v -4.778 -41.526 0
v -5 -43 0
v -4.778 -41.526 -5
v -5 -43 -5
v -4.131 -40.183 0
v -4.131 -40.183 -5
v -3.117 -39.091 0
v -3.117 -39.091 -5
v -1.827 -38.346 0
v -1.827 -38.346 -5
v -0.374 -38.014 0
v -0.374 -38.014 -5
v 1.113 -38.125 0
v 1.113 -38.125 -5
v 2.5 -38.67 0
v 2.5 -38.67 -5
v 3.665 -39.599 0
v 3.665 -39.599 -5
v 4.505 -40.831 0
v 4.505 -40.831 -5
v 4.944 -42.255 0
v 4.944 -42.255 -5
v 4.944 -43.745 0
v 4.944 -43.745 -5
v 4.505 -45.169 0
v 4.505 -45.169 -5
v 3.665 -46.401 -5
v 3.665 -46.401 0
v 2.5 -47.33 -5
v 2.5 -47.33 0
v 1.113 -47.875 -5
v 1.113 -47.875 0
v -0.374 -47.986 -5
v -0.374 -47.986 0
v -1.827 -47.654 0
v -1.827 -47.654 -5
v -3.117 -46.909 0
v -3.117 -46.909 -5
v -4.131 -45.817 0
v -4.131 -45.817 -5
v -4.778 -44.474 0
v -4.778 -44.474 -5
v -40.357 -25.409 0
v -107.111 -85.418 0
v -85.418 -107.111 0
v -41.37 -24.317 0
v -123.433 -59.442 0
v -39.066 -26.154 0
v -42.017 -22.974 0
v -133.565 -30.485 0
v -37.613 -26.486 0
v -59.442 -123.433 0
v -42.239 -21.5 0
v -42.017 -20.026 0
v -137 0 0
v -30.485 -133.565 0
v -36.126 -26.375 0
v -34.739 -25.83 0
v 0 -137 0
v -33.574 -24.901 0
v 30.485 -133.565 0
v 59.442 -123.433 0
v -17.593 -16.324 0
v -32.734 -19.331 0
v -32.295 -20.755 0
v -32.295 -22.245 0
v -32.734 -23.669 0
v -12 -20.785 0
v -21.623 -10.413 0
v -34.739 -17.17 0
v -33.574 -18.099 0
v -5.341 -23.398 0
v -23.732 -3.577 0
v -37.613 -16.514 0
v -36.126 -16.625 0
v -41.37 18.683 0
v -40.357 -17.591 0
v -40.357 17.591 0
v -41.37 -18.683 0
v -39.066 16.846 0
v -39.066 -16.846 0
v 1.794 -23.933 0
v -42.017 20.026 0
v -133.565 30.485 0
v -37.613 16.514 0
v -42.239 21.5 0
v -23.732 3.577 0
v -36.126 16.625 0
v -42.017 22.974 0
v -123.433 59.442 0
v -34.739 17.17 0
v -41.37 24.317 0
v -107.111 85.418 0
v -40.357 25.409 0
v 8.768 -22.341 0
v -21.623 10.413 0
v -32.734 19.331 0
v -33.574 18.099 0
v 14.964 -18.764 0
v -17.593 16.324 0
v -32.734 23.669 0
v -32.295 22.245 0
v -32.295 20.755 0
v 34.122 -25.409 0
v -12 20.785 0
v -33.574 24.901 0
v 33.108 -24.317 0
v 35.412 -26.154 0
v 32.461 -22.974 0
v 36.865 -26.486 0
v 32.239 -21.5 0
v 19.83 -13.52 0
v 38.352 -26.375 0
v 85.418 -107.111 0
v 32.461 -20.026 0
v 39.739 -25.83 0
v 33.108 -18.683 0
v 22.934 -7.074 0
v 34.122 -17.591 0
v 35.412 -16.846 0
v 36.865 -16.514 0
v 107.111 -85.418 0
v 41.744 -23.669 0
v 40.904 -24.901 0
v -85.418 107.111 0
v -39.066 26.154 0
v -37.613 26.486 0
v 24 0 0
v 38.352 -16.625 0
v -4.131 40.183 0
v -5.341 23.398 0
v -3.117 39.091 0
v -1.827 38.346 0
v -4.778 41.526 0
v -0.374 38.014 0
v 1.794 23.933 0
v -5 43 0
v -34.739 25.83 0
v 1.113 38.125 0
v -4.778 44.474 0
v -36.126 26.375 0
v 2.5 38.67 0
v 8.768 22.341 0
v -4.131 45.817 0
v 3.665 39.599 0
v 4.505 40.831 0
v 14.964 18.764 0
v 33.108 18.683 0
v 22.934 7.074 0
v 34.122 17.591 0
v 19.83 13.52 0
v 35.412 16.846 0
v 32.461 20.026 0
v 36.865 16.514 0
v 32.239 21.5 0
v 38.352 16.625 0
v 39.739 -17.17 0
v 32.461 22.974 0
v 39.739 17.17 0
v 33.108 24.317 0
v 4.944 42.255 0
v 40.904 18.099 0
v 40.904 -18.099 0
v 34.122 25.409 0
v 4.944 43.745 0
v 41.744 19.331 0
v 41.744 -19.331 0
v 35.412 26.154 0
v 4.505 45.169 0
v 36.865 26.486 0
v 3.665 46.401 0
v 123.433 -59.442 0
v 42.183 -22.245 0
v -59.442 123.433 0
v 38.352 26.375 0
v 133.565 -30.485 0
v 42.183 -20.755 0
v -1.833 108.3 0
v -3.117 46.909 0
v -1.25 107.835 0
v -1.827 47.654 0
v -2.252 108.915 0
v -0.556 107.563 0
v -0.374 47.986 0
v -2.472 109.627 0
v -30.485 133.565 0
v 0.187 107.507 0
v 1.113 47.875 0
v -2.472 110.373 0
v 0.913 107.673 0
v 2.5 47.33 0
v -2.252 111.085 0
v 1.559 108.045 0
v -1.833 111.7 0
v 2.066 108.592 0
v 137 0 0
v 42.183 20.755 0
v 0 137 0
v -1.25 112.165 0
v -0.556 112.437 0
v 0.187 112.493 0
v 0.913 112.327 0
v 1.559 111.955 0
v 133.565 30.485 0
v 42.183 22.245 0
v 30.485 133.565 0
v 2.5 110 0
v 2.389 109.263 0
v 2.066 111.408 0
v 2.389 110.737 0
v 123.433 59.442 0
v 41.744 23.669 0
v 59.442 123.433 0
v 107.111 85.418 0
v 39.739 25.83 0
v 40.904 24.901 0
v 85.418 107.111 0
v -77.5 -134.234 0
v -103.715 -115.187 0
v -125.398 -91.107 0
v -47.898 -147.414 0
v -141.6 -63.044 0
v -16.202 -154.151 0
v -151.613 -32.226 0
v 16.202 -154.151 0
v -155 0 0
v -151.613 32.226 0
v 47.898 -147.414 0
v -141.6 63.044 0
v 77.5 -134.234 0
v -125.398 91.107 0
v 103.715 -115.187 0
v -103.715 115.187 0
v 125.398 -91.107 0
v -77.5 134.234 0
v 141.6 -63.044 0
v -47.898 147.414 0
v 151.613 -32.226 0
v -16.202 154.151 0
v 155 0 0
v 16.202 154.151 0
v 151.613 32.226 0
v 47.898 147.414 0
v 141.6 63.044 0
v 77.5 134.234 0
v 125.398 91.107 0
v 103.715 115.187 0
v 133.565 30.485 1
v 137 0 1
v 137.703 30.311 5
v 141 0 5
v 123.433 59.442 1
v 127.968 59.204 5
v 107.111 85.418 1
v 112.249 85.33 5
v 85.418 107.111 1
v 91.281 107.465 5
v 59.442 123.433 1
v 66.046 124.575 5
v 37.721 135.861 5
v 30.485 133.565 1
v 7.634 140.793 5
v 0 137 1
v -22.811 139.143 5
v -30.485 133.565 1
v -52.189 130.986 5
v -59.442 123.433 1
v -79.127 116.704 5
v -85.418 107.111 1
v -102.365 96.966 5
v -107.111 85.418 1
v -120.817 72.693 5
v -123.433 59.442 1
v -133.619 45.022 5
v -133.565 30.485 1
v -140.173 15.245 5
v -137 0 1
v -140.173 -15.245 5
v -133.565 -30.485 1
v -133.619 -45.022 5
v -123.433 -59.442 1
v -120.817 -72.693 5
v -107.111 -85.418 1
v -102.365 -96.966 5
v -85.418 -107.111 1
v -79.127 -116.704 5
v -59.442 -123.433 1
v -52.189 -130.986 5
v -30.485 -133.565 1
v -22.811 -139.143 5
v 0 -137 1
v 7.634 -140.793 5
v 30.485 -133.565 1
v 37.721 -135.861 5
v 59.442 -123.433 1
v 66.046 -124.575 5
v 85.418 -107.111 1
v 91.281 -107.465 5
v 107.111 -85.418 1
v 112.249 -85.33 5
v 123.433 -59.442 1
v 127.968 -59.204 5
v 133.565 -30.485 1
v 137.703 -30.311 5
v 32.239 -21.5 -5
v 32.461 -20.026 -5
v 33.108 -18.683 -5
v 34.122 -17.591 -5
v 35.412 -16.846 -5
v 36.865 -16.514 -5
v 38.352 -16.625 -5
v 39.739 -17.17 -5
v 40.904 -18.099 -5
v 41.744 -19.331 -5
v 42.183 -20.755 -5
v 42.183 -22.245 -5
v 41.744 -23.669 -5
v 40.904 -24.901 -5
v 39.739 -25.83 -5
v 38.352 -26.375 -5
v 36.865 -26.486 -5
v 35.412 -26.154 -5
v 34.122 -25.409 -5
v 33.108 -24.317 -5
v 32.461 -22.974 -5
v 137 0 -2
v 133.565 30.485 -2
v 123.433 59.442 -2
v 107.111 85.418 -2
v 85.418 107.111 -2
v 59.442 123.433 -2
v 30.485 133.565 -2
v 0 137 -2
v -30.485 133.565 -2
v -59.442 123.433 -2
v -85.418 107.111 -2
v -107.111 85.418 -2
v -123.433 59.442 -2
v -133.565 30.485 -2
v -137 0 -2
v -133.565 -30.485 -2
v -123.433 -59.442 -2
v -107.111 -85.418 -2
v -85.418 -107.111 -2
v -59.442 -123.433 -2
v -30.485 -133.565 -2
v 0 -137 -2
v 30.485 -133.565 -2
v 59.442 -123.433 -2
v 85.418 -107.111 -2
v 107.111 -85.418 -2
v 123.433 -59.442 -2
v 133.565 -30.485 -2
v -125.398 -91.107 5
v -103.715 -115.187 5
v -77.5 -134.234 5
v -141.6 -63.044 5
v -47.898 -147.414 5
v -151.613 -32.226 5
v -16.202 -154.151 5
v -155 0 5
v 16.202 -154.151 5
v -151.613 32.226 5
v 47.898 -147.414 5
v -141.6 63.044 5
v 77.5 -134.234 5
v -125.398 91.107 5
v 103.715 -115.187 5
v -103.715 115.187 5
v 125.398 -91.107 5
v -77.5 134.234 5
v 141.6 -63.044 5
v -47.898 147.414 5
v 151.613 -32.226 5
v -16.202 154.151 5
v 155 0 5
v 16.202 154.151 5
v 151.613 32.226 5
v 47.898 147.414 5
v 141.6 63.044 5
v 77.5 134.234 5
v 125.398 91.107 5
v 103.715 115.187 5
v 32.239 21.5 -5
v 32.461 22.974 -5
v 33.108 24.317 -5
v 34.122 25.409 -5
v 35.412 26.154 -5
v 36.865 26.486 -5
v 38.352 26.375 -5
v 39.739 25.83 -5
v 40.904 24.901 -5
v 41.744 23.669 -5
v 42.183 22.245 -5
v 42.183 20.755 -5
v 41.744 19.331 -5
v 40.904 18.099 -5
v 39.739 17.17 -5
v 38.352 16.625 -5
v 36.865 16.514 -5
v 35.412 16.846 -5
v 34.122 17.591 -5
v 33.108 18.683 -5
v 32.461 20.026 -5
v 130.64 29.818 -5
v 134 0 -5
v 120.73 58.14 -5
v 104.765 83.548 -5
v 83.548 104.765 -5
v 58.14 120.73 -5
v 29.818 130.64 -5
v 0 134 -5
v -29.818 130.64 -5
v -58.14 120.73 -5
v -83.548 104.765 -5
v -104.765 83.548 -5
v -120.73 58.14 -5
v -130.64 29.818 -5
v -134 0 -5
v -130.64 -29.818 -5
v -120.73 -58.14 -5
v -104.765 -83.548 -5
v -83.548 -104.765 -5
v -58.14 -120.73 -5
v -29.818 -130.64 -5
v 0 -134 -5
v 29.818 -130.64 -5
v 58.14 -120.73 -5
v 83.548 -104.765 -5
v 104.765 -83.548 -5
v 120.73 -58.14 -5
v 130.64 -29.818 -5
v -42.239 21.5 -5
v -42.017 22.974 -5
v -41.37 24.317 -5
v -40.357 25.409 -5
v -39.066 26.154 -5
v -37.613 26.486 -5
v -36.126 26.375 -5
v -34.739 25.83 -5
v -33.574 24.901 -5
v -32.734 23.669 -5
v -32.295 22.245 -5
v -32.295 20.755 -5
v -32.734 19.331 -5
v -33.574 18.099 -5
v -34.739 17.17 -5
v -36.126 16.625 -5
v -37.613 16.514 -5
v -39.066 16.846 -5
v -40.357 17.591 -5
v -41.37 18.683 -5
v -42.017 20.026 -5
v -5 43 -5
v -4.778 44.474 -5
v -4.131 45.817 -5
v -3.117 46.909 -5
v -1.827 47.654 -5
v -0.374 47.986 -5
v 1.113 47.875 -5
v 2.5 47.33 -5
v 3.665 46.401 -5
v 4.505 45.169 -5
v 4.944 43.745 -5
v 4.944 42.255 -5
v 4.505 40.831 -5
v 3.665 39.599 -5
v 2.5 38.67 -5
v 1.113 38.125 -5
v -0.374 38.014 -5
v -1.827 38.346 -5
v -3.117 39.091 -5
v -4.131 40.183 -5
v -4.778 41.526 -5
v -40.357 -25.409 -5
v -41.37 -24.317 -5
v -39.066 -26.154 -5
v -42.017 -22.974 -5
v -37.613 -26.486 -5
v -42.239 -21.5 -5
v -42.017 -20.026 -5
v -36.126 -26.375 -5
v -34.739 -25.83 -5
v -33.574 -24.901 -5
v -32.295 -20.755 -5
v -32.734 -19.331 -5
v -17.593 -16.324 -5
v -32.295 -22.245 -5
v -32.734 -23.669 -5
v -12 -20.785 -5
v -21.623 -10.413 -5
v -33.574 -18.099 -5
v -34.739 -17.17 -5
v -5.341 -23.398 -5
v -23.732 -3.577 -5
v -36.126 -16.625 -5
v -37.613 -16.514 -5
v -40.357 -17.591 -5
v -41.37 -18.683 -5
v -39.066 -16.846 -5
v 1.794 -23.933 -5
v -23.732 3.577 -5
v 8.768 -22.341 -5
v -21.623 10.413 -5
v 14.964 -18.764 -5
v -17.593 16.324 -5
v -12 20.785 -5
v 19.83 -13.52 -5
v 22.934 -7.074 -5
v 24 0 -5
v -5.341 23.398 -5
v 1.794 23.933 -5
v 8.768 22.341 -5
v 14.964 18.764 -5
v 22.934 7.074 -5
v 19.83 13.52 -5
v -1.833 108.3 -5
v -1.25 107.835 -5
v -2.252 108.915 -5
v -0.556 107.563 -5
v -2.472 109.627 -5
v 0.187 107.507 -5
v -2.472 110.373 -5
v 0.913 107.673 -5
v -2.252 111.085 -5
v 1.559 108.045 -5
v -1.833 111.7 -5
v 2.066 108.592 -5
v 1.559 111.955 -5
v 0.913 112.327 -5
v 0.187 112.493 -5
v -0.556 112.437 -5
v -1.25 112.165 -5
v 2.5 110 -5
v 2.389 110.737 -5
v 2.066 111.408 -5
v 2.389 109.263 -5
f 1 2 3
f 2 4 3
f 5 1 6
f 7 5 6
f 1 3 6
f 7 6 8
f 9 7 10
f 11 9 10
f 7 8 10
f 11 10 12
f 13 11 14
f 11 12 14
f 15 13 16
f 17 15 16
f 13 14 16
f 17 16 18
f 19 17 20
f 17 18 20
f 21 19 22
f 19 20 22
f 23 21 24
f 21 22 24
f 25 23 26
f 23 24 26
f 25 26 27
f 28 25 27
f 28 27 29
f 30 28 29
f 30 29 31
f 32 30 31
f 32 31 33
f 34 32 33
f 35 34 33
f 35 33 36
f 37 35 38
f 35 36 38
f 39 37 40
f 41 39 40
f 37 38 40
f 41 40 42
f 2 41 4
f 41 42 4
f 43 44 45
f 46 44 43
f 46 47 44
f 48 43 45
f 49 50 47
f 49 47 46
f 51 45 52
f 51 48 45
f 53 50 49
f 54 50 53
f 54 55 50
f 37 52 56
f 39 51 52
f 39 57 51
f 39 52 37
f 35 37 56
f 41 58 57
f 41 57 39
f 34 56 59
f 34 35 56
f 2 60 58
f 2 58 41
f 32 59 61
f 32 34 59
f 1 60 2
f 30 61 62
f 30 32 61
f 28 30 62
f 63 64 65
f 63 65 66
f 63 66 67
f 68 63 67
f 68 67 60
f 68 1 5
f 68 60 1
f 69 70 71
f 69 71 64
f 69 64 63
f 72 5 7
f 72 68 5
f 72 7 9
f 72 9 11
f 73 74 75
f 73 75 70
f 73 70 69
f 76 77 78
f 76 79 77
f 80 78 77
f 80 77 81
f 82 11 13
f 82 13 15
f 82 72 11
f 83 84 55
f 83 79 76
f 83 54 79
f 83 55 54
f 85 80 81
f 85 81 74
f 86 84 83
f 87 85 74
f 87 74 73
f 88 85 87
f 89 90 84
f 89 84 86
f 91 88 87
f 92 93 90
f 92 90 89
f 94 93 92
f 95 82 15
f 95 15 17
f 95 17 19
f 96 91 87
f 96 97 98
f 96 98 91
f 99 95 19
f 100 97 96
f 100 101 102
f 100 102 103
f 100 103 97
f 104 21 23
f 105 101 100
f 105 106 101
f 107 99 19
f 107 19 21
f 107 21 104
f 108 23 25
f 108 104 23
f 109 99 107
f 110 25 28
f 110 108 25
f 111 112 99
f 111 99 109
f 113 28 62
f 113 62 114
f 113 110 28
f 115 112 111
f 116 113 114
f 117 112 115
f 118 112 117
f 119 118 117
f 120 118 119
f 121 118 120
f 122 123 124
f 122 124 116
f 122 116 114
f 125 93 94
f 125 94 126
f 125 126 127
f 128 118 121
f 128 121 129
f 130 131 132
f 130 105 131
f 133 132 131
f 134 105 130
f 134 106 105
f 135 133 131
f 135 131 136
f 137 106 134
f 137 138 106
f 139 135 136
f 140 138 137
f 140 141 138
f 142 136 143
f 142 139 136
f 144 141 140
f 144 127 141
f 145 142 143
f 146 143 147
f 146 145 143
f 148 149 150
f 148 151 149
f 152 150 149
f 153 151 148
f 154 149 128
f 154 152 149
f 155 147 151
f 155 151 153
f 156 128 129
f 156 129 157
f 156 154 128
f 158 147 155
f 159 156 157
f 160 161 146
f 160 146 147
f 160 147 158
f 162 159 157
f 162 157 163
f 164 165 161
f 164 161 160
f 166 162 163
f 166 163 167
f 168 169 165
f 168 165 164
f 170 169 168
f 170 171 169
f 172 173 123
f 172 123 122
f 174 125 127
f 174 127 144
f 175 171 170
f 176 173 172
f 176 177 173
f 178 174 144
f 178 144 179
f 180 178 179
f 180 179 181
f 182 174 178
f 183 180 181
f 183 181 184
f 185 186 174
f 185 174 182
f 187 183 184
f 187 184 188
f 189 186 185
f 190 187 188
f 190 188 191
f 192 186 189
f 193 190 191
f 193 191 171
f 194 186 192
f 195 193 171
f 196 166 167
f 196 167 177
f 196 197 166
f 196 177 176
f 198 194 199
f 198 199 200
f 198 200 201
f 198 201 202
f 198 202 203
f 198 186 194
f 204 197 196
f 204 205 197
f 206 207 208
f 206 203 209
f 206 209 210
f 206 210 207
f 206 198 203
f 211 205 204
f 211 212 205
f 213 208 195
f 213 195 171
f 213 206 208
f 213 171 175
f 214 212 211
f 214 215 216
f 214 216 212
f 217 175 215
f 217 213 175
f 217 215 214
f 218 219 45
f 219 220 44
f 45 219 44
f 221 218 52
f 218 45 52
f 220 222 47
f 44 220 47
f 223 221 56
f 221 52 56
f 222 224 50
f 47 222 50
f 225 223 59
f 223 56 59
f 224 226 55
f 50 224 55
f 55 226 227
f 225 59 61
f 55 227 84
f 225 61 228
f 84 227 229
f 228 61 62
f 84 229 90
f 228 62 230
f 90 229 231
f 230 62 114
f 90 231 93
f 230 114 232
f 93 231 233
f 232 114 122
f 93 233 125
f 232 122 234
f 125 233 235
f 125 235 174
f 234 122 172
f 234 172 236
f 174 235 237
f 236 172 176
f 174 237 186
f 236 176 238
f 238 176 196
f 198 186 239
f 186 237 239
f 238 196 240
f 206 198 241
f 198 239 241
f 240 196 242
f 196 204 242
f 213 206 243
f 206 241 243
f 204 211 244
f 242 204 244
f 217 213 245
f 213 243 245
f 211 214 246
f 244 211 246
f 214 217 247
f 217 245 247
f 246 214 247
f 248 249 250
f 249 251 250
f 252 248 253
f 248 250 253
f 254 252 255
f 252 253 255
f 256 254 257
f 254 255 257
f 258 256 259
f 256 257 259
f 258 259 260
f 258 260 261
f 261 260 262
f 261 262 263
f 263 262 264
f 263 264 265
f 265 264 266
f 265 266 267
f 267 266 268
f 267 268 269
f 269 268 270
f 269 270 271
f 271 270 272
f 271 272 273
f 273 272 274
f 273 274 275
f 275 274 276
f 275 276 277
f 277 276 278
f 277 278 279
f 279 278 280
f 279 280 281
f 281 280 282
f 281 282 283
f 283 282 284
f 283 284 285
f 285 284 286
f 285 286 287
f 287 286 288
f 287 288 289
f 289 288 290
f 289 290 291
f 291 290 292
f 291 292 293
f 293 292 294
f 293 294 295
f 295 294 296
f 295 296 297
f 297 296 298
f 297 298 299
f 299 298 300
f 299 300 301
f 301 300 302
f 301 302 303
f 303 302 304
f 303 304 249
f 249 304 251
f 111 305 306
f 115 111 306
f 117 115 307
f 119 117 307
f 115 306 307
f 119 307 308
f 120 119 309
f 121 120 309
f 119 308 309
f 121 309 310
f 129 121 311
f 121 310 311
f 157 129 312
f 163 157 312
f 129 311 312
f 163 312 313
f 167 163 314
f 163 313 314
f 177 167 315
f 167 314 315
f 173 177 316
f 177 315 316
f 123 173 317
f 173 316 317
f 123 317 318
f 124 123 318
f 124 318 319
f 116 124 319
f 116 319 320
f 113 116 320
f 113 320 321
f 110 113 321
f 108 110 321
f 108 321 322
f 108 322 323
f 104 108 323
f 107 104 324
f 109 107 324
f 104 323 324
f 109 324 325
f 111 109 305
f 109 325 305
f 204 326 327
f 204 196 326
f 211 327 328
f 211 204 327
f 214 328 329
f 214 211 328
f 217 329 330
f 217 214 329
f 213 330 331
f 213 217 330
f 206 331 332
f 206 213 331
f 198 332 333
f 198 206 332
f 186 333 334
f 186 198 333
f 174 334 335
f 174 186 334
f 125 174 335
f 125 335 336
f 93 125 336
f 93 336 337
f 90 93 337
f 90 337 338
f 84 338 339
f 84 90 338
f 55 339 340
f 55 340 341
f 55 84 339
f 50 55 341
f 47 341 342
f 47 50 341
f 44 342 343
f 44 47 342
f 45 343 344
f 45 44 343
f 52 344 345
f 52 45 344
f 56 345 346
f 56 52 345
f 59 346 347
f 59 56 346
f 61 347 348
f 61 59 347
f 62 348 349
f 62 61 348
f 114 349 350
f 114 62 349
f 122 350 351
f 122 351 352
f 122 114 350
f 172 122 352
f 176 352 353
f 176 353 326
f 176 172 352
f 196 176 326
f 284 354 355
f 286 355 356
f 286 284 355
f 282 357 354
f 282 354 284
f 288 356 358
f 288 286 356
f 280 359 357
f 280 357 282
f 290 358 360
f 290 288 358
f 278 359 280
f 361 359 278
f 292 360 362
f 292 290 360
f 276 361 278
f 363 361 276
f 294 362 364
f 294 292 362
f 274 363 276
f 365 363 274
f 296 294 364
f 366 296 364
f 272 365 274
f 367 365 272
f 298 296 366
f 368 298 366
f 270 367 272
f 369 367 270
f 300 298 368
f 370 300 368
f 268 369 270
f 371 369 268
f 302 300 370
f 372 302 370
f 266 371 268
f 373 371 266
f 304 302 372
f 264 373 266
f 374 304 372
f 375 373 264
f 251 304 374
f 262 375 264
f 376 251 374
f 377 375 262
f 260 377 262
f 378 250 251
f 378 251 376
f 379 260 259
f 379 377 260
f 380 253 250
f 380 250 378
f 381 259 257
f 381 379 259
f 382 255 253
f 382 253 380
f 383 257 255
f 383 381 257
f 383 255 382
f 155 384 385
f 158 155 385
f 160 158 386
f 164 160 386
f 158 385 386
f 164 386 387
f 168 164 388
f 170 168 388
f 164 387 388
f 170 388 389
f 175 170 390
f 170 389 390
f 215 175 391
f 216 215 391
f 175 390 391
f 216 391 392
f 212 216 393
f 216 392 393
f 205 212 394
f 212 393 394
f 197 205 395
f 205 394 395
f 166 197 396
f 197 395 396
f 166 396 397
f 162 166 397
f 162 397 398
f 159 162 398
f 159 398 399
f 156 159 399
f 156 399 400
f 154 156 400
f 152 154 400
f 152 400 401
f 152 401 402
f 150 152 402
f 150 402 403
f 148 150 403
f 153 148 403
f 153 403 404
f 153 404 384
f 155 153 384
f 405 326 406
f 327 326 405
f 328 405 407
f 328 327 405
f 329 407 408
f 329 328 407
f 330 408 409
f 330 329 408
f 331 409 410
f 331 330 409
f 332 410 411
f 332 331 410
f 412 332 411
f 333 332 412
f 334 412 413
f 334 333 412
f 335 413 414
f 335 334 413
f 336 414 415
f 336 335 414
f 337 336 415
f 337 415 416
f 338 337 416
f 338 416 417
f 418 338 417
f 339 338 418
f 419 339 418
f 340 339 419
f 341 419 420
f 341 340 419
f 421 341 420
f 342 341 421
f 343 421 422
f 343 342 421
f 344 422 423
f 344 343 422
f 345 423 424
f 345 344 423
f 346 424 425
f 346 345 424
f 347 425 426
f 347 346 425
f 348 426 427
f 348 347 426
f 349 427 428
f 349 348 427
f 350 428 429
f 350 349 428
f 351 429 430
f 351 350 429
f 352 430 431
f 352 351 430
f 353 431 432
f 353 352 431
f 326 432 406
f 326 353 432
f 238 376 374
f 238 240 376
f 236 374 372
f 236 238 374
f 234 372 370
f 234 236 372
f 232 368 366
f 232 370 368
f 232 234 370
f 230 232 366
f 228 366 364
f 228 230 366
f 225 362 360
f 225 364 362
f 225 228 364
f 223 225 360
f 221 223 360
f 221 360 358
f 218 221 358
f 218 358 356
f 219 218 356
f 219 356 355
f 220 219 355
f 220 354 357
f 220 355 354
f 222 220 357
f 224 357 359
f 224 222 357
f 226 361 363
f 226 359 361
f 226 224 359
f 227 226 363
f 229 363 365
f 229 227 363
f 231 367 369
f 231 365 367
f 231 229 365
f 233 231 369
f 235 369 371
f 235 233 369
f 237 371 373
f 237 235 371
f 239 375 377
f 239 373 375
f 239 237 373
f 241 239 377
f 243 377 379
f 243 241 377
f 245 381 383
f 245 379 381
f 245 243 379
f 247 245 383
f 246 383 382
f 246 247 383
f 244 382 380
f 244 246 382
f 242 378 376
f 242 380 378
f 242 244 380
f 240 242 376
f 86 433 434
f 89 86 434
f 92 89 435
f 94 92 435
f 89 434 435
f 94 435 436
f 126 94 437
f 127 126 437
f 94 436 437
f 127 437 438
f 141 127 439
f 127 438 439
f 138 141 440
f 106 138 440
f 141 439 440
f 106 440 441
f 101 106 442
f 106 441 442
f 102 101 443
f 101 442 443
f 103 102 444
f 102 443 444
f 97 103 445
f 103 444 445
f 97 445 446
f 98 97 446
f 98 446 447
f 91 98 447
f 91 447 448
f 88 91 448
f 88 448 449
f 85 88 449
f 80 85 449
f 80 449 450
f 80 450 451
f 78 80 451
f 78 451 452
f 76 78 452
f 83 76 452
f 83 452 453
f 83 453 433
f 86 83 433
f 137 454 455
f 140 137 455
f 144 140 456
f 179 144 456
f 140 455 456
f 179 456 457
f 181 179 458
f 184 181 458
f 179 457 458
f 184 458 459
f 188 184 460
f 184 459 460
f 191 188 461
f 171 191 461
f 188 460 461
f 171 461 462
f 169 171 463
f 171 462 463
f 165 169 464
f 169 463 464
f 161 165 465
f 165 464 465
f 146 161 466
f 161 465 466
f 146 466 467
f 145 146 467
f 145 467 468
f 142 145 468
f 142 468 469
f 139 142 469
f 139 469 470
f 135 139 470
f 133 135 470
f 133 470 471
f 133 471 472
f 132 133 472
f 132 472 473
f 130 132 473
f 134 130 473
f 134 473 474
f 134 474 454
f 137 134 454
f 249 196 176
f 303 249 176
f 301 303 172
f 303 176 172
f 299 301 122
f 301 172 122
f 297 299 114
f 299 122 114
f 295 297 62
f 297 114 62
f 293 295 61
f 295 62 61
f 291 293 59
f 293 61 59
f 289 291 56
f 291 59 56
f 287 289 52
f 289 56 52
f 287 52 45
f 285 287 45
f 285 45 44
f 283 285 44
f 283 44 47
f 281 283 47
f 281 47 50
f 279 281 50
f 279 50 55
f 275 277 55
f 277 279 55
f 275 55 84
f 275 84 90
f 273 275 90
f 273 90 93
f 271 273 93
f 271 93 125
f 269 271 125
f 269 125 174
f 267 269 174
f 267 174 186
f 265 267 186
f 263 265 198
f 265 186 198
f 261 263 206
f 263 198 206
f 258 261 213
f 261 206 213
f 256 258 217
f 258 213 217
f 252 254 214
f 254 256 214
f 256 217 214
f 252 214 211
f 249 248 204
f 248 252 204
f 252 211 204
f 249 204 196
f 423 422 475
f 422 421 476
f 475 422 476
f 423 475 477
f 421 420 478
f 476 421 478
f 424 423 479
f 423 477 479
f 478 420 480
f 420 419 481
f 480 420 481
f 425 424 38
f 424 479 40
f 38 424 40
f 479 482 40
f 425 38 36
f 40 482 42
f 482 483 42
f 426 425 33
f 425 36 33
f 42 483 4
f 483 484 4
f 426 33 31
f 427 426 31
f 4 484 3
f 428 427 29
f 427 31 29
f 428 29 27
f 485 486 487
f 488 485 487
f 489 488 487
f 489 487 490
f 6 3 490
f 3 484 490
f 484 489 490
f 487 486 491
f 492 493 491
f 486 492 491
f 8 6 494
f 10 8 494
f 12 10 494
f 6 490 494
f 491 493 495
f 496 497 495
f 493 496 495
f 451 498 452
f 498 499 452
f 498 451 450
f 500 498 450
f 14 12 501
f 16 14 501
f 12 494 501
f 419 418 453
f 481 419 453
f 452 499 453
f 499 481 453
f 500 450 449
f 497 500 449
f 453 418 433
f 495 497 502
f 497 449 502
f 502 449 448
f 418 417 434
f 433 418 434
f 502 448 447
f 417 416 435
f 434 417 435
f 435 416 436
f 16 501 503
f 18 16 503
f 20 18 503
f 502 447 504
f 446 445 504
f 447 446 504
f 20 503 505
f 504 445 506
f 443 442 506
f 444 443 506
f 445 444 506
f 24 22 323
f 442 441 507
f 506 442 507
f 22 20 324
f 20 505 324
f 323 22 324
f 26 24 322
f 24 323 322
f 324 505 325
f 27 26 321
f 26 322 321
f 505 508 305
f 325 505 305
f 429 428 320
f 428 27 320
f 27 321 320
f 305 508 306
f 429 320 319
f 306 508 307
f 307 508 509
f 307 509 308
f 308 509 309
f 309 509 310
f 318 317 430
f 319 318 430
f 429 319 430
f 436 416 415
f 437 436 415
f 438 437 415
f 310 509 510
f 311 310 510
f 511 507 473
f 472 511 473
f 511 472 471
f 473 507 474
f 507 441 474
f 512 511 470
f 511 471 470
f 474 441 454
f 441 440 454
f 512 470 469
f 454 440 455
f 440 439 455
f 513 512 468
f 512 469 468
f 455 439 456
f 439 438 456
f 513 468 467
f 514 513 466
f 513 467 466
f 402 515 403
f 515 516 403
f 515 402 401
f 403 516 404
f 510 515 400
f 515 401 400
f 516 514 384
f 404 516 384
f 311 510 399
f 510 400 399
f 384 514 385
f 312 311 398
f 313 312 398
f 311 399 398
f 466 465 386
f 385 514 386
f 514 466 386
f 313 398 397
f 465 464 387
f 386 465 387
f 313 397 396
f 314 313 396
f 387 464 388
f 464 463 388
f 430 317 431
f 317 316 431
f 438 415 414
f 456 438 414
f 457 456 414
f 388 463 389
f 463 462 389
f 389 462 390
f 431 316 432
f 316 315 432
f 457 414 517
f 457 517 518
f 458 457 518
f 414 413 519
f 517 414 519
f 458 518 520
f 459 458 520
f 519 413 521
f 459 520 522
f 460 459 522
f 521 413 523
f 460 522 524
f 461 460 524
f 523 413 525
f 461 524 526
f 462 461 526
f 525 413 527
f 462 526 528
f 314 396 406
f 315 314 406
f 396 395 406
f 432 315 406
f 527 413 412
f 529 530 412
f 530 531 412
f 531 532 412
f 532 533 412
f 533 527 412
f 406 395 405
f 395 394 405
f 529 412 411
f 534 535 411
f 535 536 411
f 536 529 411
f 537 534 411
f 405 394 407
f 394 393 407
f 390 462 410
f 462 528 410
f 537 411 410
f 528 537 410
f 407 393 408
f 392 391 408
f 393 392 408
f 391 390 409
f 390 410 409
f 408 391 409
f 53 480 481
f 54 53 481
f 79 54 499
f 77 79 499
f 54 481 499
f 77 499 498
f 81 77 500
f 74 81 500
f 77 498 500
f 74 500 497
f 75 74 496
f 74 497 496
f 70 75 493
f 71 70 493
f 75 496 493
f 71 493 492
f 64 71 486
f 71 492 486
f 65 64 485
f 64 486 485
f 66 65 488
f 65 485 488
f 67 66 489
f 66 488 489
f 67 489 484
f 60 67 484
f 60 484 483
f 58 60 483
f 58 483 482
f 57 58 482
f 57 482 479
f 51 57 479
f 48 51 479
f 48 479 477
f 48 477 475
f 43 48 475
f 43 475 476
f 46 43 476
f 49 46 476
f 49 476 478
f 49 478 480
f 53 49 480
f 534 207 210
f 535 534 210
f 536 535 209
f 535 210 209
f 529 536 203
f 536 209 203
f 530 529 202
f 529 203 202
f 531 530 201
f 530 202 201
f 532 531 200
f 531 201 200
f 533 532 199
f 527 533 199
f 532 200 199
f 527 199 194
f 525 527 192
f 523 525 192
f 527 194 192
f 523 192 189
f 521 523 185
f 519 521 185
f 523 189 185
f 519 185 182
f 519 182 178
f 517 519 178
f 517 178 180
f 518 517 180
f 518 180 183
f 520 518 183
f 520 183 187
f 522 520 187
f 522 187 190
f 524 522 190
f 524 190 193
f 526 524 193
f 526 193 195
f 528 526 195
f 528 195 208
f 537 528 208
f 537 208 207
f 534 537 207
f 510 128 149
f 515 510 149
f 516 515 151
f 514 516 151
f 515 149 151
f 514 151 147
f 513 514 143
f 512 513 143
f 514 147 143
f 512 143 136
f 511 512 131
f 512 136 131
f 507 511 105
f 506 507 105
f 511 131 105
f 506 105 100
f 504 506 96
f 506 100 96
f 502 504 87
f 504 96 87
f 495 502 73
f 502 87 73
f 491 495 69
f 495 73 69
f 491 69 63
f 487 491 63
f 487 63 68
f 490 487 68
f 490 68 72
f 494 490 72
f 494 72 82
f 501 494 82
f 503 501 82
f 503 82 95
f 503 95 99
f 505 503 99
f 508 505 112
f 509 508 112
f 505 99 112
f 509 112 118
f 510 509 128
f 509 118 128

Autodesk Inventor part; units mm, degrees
ref_plane "YZ Plane" through (0, 0, 0) normal (1, 0, 0) x (0, 1, 0)
ref_plane "XZ Plane" through (0, 0, 0) normal (0, 1, 0) x (-1, 0, 0)
sketch "Sketch1" plane through (0, 0, 0) normal (0, 0, 1) x (1, 0, 0)
  circle A0 centre (0, 0) radius 155
  circle A1 centre (0, 0) radius 24
  circle A2 centre (0, 0) radius 137
  dimension "d0" = 310
  dimension "d1" = 48
  dimension "d2" = 274
extrude "Extrusion1" add sketch "Sketch1" along normal blind 5 contours A0 | A2
extrude "Extrusion2" cut sketch "Sketch1" along normal blind 5 contours A2
extrude "Extrusion3" add sketch "Sketch1" against normal blind 5 contours A2
chamfer "Chamfer1" distance 3 angle 45 1 edges at (-137, 0, -5)
chamfer "Chamfer2" distance 4 angle 45 1 edges at (-137, 0, 5)
sketch "Sketch2" plane through (0, 0, -5) normal (0, 0, -1) x (-1, 0, 0)
  circle A0 centre (0, 43) radius 5
  circle A1 centre (-37.2391, 21.5) radius 5
  circle A2 centre (-37.2391, -21.5) radius 5
  circle A3 centre (0, -43) radius 5
  circle A4 centre (37.2391, -21.5) radius 5
  circle A5 centre (37.2391, 21.5) radius 5
  point P0 (0, 0)
  point P1 (0, 0)
  point P2 (0, 0)
  point P3 (0, 0)
  point P4 (0, 0)
  point P5 (0, 0)
  point P6 (0, 0)
  point P7 (0, 0)
  point P8 (0, 0)
  point P9 (0, 0)
  point P10 (0, 0)
  point P11 (0, 0)
  dimension "d17" = 10
  dimension "d18" = 43
  dimension "d21" = 360
extrude "Extrusion4" cut sketch "Sketch2" against normal blind 5
sketch "Sketch3" plane through (0, 0, -5) normal (0, 0, -1) x (-1, 0, 0)
  point P0 (0, 0)
ref_plane "Work Plane1" through (0, 0, 5) normal (0, 0, 1) x (1, 0, 0)
sketch "Sketch5" plane through (0, 0, 5) normal (0, 0, 1) x (1, 0, 0)
  circle A0 centre (0, 110) radius 2.5
  circle A1 centre (0, 0) radius 155 projected
  line L0 (0, 155) -> (0, 110)
  dimension "d31" = 5
  dimension "d32" = 45
extrude "Extrusion6" cut sketch "Sketch5" against normal blind 10 contours A0
properties part number "DiskForBrakes" material "Steel, Alloy"
